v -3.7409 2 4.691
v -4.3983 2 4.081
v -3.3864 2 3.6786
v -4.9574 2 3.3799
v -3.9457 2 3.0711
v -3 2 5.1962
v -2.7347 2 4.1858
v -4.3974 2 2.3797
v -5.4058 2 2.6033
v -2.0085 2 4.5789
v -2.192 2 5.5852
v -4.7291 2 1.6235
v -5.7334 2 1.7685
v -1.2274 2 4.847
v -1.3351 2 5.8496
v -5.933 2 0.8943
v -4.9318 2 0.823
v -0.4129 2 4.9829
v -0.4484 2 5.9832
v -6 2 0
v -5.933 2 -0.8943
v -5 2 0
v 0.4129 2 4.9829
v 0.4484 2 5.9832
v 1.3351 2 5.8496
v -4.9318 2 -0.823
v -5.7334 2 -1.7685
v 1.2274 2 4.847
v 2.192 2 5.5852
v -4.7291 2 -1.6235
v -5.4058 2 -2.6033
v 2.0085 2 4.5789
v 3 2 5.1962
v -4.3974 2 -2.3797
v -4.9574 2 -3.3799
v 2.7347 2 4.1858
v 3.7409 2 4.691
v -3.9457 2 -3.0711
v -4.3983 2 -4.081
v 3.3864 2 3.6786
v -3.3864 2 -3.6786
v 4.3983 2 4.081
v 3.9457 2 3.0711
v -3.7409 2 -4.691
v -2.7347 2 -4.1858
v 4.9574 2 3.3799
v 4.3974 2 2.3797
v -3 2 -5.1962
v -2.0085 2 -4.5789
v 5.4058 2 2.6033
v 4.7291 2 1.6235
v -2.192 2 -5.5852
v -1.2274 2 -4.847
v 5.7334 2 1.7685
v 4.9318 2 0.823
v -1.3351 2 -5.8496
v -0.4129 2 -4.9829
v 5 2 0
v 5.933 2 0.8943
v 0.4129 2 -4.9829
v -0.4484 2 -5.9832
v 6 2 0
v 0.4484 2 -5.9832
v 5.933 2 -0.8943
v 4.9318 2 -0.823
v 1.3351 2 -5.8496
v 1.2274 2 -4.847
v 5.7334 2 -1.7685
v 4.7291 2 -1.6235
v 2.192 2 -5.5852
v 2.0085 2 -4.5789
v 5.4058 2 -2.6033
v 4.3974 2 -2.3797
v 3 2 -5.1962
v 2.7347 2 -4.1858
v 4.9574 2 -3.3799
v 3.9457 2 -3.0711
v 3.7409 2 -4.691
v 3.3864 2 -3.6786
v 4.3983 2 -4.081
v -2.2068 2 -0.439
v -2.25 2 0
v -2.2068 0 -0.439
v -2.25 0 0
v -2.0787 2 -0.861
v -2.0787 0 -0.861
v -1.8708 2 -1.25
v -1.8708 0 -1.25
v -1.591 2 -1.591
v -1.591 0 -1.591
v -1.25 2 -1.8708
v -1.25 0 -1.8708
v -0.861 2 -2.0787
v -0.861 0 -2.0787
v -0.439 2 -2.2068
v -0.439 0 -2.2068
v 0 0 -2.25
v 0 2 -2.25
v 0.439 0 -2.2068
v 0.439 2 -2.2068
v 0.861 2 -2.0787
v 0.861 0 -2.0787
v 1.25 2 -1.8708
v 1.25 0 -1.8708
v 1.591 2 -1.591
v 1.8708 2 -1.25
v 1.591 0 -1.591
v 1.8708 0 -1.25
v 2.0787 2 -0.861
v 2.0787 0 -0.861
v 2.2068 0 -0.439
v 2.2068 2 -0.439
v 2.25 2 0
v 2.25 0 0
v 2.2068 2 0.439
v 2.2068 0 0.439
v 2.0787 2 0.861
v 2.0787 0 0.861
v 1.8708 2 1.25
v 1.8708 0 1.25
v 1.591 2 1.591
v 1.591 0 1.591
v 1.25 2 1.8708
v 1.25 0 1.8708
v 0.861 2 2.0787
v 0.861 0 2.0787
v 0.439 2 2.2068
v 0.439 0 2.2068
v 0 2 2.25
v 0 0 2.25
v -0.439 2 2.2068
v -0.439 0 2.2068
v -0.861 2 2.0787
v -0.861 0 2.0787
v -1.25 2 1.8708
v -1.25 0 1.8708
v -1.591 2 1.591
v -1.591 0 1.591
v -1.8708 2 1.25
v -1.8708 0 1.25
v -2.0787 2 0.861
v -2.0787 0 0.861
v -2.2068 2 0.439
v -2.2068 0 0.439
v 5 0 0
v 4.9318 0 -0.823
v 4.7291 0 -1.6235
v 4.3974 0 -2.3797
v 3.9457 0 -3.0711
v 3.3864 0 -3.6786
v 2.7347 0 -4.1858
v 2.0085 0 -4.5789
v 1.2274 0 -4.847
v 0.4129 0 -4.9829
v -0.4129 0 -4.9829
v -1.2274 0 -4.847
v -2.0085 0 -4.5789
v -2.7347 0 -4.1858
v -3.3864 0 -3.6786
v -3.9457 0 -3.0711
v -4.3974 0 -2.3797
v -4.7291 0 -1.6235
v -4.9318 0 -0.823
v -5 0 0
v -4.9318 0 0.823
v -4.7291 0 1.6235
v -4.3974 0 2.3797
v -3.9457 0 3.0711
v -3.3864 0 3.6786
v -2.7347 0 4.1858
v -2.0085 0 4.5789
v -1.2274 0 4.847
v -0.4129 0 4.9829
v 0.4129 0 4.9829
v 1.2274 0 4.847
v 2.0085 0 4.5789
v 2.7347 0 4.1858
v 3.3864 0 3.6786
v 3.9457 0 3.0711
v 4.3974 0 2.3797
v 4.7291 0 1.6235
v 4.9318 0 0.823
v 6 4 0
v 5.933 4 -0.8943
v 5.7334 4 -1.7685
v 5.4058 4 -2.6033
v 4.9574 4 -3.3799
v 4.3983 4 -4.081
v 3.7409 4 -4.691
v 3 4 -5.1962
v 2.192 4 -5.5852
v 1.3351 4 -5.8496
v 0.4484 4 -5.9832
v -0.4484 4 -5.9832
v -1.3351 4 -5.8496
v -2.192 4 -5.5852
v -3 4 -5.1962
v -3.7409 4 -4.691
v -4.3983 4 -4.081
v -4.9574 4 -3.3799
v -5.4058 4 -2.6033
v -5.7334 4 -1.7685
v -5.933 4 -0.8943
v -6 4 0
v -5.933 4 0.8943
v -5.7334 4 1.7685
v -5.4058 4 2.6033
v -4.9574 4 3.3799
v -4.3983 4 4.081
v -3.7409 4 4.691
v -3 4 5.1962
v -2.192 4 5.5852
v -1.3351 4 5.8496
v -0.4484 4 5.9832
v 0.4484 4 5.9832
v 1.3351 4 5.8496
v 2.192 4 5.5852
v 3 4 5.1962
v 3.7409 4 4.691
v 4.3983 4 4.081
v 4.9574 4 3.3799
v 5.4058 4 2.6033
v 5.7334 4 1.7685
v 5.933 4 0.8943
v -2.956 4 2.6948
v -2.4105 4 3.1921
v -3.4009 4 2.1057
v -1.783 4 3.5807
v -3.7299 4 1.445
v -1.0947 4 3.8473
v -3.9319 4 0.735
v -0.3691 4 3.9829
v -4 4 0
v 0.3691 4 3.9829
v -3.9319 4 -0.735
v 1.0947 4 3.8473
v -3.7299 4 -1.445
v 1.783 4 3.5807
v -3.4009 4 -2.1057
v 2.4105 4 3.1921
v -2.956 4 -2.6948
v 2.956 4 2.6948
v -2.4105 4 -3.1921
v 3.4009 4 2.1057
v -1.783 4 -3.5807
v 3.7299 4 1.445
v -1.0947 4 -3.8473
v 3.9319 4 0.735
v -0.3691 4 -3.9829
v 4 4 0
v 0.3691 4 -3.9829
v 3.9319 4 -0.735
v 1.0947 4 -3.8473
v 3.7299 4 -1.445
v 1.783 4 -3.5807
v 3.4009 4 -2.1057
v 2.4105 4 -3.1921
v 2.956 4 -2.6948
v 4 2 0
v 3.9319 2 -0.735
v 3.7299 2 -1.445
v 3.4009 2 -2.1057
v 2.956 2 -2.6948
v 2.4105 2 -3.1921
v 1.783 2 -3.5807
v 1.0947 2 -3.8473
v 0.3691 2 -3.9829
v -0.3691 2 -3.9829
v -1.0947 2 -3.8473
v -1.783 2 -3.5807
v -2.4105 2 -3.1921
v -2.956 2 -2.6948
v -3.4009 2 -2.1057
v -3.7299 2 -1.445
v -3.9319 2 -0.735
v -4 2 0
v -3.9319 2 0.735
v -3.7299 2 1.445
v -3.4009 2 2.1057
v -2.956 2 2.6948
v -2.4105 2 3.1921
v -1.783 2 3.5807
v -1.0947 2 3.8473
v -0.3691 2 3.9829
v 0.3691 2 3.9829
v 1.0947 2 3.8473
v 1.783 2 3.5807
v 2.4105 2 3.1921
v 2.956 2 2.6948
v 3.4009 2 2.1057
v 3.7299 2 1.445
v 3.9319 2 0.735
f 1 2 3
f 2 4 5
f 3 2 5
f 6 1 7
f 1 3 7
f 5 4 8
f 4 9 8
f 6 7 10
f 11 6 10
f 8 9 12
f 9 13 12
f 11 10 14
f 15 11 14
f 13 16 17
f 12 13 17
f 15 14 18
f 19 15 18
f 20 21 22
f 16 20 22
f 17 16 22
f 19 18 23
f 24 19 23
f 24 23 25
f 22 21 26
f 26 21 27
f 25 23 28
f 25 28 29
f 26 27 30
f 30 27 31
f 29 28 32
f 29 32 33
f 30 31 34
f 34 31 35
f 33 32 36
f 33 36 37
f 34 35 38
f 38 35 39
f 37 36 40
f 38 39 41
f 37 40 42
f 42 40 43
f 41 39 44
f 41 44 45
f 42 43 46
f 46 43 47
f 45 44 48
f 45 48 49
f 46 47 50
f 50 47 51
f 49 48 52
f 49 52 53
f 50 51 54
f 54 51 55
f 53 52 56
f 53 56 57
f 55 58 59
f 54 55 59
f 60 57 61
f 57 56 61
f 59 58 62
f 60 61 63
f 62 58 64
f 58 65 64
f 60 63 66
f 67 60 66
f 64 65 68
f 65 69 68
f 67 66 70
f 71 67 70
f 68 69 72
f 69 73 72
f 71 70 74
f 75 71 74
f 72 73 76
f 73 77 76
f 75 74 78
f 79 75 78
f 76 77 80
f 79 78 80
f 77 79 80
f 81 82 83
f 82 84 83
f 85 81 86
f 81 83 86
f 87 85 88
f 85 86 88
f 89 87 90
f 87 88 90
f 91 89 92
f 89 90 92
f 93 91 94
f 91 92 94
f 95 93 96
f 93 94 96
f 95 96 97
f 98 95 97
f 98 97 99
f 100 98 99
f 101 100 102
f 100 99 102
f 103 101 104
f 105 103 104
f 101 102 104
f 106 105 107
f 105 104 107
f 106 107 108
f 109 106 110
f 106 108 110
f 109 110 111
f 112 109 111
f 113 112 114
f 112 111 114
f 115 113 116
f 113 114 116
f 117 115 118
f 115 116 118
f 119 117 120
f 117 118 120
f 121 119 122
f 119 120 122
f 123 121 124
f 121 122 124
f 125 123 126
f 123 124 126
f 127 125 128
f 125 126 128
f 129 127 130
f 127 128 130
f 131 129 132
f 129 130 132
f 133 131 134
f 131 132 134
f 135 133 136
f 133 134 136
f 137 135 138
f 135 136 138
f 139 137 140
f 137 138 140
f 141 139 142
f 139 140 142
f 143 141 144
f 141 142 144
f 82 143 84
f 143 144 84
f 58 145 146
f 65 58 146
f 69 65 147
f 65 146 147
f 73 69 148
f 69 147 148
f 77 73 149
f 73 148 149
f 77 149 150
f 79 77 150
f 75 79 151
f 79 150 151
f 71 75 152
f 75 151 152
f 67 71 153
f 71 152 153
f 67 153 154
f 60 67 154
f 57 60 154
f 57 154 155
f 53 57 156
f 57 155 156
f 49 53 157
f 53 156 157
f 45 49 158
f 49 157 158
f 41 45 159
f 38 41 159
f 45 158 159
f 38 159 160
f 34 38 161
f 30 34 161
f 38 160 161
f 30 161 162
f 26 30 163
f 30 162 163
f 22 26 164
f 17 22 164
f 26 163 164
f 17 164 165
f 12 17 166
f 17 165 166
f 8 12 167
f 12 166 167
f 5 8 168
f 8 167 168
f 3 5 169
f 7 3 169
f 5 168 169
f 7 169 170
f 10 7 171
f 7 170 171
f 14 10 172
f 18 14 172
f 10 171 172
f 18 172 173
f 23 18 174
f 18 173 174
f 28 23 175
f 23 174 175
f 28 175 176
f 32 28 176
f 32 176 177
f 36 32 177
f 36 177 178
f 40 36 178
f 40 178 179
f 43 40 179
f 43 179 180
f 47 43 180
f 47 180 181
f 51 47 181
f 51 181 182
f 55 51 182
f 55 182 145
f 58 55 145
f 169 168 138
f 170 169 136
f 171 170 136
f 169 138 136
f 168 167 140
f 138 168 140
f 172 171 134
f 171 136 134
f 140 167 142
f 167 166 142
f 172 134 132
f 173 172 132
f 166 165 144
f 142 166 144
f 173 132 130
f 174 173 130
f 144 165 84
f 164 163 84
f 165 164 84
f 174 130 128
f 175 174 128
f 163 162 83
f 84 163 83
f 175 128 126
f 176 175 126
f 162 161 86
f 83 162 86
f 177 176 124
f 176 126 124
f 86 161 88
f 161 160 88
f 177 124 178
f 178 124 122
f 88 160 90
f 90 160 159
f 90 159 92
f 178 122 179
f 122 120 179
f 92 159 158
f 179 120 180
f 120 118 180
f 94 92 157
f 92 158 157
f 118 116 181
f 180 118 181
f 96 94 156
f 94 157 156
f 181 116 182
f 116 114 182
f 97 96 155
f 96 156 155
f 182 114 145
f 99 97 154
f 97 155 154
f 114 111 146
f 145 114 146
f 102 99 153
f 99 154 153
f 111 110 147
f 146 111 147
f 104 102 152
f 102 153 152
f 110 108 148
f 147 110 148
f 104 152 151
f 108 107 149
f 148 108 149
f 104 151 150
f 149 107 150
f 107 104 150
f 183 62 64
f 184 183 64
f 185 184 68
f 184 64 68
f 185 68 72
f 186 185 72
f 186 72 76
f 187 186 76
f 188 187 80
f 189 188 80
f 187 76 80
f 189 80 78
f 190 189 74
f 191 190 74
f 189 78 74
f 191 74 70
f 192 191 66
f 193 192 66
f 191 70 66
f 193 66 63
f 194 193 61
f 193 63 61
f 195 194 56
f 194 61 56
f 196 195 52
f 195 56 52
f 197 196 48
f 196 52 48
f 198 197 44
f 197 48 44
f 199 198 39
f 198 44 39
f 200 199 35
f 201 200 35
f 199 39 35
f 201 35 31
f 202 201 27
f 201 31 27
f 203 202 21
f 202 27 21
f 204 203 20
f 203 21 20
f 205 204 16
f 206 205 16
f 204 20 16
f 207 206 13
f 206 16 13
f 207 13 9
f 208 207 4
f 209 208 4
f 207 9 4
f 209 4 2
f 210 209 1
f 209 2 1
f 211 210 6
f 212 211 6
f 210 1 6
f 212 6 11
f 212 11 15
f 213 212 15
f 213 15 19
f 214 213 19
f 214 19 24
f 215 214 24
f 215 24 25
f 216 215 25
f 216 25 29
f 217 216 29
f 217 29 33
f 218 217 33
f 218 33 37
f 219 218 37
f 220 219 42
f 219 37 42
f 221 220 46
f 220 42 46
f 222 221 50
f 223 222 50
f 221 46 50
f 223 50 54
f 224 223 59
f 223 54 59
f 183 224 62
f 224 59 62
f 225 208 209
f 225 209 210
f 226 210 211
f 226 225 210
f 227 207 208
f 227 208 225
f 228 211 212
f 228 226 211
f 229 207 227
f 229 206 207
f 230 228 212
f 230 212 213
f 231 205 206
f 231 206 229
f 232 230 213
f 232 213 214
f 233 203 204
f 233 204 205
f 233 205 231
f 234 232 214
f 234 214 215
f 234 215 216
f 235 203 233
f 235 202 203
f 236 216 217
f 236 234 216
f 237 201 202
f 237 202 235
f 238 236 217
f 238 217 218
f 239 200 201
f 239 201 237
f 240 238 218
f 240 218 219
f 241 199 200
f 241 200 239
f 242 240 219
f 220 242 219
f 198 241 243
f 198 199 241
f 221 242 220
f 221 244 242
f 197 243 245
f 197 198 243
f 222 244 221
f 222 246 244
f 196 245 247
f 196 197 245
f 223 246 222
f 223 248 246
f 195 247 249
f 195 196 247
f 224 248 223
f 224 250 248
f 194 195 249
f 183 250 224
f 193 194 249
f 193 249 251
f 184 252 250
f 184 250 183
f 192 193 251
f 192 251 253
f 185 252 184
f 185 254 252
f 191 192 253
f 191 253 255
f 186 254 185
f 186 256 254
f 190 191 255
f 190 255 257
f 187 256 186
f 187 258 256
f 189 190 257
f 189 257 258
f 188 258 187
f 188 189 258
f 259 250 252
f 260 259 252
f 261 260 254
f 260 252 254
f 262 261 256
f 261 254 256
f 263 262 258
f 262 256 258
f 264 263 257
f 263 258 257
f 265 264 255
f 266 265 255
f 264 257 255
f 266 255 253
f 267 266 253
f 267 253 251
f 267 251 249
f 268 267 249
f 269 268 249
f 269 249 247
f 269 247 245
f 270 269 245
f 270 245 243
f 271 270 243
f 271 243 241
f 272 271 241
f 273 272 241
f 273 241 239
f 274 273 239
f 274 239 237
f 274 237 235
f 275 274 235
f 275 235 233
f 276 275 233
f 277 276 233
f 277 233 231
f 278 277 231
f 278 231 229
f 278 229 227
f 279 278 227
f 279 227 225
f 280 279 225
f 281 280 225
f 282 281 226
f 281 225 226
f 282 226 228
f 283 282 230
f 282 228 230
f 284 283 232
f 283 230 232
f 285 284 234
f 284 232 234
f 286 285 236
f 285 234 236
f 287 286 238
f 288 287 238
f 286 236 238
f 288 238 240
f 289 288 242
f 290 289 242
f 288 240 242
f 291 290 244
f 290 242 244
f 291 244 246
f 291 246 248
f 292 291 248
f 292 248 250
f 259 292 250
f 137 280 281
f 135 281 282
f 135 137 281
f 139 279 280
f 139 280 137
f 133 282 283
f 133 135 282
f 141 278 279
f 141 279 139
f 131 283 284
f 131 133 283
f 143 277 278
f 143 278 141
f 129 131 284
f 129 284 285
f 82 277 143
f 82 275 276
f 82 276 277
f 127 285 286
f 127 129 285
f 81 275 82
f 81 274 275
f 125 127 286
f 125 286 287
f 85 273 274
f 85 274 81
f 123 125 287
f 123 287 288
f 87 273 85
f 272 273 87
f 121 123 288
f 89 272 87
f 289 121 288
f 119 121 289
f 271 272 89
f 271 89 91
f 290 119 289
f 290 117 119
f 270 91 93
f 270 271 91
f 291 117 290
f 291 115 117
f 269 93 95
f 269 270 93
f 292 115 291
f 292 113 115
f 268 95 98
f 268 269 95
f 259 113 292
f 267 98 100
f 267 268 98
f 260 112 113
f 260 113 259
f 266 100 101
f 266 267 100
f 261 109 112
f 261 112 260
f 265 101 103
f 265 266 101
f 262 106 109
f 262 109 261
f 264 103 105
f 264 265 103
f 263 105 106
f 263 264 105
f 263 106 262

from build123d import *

# Parameters (mm, degrees)
SKETCH_1_R                   = 5
EXTRUDE_1_DEPTH              = 2
SKETCH_2_R                   = 6
EXTRUDE_2_DEPTH              = 2
HOLE_WIZARD_M4_1_D           = 4.5
HOLE_WIZARD_M4_1_CBORE_D     = 8
HOLE_WIZARD_M4_1_CBORE_DEPTH = 2


with BuildPart() as part:
    # 스케치1 → 보스-돌출1 (new body)
    with BuildSketch(Plane(origin=(0, 0, 0), x_dir=(1, 0, 0), z_dir=(0, 1, 0))):
        Circle(SKETCH_1_R)
    extrude(amount=EXTRUDE_1_DEPTH)

    # 스케치2 → 보스-돌출2 (add)
    with BuildSketch(Plane(origin=(0, 2, 0), x_dir=(1, 0, 0), z_dir=(0, 1, 0))):
        Circle(SKETCH_2_R)
    extrude(amount=EXTRUDE_2_DEPTH)

    # M4 육각 소켓 머리 캡 나사용 카운터보어1 (through all)
    with Locations(Plane(origin=(0, 4, 0), x_dir=(1, 0, 0), z_dir=(0, 1, 0))):
        with Locations((0, 0)):
            CounterBoreHole(HOLE_WIZARD_M4_1_D / 2, HOLE_WIZARD_M4_1_CBORE_D / 2, HOLE_WIZARD_M4_1_CBORE_DEPTH)


solid = part.part
